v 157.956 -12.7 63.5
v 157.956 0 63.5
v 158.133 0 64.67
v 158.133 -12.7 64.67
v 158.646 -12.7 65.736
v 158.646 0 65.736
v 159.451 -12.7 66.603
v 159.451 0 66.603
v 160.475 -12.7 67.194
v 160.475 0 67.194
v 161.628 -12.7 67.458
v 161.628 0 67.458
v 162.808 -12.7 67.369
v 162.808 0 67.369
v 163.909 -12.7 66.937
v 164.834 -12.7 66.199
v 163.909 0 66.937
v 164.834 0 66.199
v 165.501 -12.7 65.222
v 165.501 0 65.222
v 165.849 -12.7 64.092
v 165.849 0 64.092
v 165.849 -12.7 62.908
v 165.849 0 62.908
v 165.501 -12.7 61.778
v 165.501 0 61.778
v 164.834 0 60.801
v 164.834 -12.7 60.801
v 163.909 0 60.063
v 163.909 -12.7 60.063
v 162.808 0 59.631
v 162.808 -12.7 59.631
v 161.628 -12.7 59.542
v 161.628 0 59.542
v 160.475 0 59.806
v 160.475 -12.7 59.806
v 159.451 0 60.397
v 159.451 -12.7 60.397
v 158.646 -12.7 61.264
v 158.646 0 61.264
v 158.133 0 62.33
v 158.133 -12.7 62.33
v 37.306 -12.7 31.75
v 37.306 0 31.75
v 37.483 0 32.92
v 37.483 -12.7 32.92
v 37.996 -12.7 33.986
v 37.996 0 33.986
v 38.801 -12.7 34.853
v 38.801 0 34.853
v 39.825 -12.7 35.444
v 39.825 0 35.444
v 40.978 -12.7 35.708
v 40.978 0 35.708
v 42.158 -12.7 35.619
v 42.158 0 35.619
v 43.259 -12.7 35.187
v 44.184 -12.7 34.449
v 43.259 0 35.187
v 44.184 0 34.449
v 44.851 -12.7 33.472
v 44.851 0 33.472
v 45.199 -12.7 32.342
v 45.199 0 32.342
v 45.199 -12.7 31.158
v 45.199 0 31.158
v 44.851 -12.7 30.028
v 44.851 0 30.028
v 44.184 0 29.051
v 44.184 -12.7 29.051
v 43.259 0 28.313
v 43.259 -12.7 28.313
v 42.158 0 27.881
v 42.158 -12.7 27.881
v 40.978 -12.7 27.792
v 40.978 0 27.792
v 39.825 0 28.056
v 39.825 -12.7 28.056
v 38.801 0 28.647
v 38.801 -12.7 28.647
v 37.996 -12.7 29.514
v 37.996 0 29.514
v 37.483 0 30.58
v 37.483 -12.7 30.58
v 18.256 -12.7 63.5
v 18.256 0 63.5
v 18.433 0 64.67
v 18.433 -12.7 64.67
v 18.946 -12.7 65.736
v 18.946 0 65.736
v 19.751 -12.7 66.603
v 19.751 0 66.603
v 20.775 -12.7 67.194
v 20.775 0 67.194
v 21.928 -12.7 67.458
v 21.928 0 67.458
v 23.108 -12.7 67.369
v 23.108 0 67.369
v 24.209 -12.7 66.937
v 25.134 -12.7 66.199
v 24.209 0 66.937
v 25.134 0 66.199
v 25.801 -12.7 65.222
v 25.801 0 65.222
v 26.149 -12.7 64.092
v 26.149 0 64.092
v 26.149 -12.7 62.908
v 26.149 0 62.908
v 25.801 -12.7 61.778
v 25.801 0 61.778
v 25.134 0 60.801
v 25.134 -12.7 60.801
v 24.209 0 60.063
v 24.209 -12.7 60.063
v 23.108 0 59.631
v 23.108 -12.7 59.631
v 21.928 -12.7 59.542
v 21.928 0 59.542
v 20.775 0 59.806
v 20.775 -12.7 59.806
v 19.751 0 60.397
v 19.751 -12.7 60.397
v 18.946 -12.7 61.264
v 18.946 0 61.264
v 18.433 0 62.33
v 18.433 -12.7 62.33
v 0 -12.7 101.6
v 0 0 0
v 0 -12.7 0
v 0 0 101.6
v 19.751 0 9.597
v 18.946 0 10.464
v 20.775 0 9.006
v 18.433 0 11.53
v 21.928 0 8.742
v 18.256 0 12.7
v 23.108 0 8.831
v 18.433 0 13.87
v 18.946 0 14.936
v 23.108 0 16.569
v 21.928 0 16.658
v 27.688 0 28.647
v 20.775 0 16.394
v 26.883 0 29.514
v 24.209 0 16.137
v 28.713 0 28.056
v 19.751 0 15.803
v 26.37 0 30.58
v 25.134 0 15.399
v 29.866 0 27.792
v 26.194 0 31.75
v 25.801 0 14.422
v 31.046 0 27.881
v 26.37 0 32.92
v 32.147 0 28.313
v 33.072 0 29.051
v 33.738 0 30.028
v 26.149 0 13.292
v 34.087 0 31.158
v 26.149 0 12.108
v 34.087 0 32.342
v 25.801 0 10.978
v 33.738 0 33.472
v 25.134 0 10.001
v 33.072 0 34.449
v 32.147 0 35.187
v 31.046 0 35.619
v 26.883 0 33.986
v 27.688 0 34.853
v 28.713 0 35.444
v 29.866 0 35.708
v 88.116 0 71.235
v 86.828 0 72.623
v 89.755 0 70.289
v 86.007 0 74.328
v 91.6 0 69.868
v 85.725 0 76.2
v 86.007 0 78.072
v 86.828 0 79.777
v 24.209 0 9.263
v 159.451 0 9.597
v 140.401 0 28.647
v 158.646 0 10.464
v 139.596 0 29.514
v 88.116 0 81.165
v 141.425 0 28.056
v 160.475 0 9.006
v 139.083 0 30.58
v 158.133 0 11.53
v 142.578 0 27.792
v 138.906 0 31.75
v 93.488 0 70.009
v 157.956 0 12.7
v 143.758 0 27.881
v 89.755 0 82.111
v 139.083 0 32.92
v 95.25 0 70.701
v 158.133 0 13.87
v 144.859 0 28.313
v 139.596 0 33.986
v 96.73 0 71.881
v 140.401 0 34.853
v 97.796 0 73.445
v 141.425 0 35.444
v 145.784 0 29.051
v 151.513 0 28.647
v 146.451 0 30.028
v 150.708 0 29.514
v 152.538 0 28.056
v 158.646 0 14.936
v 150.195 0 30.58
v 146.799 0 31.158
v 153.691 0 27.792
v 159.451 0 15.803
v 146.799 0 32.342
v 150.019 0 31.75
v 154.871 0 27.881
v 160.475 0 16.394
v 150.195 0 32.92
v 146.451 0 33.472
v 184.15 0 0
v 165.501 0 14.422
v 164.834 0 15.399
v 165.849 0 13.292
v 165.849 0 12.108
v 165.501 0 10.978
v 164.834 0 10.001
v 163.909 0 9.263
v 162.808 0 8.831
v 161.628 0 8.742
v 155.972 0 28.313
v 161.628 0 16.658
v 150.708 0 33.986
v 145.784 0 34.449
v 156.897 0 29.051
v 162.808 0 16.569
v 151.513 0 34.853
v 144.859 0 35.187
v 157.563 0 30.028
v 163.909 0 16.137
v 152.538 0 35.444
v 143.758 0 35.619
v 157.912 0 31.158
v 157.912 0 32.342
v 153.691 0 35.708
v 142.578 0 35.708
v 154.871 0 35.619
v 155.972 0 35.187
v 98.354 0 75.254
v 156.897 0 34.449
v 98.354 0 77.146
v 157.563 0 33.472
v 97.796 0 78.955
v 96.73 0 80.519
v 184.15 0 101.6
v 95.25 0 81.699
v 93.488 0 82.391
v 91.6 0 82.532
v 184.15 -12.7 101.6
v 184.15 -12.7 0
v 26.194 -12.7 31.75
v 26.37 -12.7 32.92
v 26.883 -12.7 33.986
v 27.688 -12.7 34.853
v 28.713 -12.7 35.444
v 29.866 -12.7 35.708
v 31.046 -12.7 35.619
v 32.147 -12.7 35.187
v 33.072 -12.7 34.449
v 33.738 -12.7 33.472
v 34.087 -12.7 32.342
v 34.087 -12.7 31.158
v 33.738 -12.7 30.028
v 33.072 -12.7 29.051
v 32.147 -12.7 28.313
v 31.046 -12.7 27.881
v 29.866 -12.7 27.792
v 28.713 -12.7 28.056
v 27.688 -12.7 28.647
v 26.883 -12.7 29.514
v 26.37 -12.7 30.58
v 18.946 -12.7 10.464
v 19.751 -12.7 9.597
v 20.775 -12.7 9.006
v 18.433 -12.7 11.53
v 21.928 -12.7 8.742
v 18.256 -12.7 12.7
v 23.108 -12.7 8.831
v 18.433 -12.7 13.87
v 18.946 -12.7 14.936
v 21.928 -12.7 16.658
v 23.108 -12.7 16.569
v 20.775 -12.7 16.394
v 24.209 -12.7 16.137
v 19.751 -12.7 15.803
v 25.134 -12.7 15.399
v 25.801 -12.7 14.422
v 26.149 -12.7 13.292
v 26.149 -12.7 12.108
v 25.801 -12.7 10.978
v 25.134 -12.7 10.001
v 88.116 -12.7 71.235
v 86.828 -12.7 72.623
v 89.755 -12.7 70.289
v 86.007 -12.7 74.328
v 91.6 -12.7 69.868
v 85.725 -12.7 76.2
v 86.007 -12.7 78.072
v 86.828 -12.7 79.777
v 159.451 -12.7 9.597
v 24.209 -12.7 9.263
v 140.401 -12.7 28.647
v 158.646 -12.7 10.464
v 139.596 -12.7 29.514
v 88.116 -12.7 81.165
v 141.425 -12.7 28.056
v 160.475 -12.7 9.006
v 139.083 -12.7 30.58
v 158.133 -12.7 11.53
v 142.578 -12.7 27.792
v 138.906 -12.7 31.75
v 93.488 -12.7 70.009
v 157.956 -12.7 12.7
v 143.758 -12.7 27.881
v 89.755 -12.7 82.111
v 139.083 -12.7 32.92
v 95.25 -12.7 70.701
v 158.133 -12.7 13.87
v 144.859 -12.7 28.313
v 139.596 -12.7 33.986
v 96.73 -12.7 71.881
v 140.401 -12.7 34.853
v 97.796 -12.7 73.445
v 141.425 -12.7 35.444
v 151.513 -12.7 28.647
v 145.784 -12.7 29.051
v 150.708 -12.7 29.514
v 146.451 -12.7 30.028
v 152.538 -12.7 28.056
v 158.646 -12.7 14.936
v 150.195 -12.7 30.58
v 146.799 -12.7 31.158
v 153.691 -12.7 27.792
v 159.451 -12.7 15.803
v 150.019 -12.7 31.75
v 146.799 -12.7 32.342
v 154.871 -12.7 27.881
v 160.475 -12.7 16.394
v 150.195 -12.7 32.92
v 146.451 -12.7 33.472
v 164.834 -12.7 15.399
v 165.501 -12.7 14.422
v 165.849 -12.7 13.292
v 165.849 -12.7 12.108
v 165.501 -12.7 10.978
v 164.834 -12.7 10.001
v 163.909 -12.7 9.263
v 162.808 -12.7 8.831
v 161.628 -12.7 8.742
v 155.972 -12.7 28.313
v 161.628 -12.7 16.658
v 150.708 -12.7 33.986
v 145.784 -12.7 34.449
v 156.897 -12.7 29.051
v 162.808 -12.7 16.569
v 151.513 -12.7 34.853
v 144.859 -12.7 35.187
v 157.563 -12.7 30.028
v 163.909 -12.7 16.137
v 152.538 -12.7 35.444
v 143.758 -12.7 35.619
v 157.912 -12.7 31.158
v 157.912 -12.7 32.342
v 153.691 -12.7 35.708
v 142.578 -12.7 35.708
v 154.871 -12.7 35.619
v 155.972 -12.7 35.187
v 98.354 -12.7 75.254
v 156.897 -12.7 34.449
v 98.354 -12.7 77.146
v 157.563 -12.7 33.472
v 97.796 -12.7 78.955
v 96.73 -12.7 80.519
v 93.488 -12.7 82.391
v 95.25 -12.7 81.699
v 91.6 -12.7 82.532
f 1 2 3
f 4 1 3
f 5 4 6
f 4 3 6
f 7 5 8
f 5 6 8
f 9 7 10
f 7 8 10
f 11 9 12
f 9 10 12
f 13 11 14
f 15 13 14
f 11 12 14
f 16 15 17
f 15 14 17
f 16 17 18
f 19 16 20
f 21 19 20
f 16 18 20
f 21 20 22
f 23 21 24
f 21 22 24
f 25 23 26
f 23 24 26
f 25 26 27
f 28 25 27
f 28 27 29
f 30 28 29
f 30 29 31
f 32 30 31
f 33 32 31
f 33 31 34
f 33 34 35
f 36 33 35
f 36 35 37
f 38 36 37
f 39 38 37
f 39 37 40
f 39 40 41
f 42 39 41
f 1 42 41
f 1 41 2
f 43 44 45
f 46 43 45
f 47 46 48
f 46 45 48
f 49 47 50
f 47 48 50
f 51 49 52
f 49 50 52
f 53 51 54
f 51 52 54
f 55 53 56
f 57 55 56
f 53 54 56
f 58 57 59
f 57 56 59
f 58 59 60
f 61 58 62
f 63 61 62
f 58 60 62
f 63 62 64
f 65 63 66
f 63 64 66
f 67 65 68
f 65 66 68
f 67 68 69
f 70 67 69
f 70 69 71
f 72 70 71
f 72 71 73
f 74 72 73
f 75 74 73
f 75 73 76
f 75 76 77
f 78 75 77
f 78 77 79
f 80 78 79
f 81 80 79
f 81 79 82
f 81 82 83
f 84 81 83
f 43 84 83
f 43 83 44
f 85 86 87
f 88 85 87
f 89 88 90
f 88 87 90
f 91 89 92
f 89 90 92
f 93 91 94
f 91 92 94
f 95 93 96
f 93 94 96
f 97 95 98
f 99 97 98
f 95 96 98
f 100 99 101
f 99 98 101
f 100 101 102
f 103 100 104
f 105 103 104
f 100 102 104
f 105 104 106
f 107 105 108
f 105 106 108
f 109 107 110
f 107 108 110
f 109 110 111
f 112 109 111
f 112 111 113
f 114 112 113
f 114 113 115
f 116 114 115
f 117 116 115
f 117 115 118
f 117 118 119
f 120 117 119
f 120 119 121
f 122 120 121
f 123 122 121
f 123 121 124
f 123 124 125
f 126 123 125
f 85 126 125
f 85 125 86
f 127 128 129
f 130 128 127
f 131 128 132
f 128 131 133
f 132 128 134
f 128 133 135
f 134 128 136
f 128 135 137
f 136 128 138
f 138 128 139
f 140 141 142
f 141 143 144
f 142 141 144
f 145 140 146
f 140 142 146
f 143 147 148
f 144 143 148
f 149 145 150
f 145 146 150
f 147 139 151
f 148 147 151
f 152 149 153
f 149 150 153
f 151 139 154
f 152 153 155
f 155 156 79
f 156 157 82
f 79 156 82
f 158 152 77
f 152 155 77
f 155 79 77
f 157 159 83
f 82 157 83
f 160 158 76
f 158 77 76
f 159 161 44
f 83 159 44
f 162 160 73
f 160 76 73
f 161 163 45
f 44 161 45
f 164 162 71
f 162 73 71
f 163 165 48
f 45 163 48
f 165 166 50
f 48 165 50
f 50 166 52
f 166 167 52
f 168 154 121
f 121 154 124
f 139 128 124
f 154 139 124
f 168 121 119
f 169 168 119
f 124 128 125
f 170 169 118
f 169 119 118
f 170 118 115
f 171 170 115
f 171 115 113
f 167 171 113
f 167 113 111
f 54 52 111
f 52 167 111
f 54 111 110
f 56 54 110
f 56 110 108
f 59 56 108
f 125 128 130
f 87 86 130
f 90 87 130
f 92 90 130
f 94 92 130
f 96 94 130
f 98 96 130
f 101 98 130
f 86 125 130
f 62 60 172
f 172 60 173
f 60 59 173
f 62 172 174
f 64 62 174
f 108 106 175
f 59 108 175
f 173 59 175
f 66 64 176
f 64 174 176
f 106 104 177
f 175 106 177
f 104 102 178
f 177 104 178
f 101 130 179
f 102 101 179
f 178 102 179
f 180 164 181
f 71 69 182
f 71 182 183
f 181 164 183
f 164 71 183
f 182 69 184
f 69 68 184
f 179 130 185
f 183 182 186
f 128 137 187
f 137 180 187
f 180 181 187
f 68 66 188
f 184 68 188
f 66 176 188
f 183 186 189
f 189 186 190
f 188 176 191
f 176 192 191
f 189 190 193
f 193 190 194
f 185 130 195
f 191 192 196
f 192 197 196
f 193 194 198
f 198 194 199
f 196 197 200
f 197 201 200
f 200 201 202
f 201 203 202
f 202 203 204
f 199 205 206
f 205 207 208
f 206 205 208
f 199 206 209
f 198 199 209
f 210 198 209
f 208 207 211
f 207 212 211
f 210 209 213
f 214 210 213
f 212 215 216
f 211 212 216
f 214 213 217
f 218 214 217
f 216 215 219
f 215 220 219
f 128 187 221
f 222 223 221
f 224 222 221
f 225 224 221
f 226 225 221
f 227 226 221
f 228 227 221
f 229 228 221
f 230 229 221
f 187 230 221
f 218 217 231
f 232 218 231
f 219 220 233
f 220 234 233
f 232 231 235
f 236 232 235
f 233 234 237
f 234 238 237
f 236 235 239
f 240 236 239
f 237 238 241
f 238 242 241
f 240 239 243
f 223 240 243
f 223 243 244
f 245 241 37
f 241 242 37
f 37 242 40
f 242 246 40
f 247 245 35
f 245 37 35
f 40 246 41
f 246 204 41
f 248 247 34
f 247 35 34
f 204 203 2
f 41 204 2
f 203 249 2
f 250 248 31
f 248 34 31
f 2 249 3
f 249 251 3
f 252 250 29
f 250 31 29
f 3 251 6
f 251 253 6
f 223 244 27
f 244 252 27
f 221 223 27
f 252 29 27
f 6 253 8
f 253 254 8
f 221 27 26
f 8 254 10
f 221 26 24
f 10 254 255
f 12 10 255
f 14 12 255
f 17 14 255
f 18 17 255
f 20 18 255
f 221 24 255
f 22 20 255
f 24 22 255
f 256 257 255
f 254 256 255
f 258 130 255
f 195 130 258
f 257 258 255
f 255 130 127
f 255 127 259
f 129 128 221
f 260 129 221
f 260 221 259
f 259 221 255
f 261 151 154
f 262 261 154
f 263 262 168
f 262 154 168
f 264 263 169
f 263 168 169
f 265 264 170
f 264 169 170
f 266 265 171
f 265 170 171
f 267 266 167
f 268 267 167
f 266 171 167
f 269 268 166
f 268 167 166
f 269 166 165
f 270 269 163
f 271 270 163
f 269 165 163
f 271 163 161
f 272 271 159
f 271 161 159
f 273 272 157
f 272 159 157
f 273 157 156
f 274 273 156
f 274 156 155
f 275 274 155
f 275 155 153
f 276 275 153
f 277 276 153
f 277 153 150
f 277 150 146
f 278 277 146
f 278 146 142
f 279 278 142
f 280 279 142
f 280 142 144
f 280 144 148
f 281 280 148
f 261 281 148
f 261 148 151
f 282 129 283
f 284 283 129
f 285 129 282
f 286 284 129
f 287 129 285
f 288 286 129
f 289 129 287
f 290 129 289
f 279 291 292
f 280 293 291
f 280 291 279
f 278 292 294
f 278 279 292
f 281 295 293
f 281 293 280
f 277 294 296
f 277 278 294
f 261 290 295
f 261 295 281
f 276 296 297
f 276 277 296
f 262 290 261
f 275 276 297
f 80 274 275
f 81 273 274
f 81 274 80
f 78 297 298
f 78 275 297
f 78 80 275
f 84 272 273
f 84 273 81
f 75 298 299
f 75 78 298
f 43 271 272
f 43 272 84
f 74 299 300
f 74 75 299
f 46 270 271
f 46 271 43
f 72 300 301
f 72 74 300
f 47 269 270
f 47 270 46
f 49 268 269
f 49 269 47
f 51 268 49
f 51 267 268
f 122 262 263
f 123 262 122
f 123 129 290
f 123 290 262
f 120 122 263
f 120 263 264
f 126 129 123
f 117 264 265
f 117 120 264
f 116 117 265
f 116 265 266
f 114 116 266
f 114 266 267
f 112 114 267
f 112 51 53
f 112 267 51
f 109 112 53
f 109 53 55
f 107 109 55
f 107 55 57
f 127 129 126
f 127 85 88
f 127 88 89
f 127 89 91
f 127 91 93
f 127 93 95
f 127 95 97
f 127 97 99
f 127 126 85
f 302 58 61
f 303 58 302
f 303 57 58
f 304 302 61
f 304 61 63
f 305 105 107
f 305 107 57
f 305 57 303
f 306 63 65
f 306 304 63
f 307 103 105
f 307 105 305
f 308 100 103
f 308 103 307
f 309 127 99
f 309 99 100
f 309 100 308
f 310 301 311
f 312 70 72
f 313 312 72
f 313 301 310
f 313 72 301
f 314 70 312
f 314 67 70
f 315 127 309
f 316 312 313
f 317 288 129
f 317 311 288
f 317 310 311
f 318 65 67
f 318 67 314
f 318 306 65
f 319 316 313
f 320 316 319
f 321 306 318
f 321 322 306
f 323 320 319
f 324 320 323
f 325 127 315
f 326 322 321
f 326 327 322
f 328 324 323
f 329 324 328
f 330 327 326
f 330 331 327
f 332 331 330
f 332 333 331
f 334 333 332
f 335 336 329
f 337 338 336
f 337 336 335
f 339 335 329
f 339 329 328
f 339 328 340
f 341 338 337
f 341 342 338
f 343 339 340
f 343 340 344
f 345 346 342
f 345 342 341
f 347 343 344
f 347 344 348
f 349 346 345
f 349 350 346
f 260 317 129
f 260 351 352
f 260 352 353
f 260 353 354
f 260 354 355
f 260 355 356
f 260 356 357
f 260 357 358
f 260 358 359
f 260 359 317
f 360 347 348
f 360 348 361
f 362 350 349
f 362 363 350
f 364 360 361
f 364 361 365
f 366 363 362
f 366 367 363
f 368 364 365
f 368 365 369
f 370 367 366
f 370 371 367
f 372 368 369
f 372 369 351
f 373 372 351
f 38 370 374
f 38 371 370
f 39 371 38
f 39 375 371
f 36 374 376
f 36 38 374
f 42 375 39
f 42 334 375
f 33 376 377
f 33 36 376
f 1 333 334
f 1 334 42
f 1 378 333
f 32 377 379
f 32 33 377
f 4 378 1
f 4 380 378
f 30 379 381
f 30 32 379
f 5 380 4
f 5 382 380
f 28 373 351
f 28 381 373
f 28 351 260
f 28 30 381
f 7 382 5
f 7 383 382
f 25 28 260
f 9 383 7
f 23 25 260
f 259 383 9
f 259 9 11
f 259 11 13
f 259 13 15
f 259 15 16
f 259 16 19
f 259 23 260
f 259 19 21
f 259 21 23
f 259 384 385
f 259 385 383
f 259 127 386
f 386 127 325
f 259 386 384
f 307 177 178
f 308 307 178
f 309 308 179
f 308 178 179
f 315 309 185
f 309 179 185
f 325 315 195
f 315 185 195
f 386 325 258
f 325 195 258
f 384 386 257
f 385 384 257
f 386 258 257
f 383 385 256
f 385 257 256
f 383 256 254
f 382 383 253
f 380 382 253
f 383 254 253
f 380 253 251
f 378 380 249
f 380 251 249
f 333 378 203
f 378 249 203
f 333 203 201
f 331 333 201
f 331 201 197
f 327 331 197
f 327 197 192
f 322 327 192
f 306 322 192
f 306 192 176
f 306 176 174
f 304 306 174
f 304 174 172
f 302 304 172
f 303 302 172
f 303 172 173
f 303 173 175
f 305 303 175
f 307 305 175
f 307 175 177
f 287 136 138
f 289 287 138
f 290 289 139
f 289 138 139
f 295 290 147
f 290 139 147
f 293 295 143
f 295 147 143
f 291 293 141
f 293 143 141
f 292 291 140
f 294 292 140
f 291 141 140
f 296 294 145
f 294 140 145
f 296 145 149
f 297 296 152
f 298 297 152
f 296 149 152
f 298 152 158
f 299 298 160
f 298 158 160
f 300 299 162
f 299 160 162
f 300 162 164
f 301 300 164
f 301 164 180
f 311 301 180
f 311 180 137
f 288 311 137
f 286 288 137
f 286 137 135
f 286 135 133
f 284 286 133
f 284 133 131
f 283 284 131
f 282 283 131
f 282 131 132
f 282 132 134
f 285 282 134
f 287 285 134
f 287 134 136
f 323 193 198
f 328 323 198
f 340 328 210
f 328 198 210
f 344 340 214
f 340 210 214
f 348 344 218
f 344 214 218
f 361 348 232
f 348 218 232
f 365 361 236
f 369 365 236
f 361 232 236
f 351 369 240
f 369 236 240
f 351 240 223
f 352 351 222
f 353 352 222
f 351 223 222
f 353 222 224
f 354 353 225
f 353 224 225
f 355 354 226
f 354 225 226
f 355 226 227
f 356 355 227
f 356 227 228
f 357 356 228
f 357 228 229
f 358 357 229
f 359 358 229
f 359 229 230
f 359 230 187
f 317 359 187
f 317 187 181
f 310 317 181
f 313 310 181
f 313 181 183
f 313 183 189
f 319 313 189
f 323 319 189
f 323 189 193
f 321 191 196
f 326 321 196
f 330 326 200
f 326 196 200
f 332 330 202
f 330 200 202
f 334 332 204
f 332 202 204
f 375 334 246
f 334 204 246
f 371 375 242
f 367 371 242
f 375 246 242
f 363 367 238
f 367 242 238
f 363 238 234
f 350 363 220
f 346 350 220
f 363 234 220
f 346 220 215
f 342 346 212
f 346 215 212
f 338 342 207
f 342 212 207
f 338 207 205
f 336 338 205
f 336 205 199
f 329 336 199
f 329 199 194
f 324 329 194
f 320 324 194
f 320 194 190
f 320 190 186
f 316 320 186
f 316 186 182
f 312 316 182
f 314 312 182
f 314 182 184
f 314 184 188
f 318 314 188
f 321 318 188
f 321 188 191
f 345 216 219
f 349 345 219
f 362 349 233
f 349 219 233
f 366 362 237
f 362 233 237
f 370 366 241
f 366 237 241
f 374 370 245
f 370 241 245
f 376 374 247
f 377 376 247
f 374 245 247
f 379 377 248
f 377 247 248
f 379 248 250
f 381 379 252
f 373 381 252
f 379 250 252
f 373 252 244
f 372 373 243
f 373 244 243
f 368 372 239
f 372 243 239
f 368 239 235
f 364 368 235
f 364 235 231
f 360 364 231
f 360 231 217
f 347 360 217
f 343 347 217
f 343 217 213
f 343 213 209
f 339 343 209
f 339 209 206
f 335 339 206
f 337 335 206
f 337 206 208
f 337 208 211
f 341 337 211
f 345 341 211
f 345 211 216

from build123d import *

# Parameters (mm, degrees)
F0_W     = 184.15
F0_H     = 101.6
F1_DEPTH = 12.7
F3_D     = 12.7
F5_D     = 7.9375
F7_D     = 7.9375


with BuildPart() as f1:
    # F0 (on Front) → F1 (new body)
    with BuildSketch(Plane.XZ):
        with Locations((92.075, 50.8)):
            Rectangle(F0_W, F0_H)
    extrude(amount=F1_DEPTH)

    # F3 (through all)
    with Locations(Plane.XZ.offset(12.7)):
        with Locations((92.075, 76.2)):
            Hole(F3_D / 2)

    # F5 (through all)
    with Locations(Plane.XZ.offset(12.7)):
        with Locations((22.225, 63.5), (161.925, 63.5), (161.925, 12.7), (22.225, 12.7)):
            Hole(F5_D / 2)

    # F7 (through all)
    with Locations(Plane.XZ.offset(12.7)):
        with Locations((41.275, 31.75), (142.875, 31.75), (30.1625, 31.75), (153.9875, 31.75)):
            Hole(F7_D / 2)


solid = f1.part
